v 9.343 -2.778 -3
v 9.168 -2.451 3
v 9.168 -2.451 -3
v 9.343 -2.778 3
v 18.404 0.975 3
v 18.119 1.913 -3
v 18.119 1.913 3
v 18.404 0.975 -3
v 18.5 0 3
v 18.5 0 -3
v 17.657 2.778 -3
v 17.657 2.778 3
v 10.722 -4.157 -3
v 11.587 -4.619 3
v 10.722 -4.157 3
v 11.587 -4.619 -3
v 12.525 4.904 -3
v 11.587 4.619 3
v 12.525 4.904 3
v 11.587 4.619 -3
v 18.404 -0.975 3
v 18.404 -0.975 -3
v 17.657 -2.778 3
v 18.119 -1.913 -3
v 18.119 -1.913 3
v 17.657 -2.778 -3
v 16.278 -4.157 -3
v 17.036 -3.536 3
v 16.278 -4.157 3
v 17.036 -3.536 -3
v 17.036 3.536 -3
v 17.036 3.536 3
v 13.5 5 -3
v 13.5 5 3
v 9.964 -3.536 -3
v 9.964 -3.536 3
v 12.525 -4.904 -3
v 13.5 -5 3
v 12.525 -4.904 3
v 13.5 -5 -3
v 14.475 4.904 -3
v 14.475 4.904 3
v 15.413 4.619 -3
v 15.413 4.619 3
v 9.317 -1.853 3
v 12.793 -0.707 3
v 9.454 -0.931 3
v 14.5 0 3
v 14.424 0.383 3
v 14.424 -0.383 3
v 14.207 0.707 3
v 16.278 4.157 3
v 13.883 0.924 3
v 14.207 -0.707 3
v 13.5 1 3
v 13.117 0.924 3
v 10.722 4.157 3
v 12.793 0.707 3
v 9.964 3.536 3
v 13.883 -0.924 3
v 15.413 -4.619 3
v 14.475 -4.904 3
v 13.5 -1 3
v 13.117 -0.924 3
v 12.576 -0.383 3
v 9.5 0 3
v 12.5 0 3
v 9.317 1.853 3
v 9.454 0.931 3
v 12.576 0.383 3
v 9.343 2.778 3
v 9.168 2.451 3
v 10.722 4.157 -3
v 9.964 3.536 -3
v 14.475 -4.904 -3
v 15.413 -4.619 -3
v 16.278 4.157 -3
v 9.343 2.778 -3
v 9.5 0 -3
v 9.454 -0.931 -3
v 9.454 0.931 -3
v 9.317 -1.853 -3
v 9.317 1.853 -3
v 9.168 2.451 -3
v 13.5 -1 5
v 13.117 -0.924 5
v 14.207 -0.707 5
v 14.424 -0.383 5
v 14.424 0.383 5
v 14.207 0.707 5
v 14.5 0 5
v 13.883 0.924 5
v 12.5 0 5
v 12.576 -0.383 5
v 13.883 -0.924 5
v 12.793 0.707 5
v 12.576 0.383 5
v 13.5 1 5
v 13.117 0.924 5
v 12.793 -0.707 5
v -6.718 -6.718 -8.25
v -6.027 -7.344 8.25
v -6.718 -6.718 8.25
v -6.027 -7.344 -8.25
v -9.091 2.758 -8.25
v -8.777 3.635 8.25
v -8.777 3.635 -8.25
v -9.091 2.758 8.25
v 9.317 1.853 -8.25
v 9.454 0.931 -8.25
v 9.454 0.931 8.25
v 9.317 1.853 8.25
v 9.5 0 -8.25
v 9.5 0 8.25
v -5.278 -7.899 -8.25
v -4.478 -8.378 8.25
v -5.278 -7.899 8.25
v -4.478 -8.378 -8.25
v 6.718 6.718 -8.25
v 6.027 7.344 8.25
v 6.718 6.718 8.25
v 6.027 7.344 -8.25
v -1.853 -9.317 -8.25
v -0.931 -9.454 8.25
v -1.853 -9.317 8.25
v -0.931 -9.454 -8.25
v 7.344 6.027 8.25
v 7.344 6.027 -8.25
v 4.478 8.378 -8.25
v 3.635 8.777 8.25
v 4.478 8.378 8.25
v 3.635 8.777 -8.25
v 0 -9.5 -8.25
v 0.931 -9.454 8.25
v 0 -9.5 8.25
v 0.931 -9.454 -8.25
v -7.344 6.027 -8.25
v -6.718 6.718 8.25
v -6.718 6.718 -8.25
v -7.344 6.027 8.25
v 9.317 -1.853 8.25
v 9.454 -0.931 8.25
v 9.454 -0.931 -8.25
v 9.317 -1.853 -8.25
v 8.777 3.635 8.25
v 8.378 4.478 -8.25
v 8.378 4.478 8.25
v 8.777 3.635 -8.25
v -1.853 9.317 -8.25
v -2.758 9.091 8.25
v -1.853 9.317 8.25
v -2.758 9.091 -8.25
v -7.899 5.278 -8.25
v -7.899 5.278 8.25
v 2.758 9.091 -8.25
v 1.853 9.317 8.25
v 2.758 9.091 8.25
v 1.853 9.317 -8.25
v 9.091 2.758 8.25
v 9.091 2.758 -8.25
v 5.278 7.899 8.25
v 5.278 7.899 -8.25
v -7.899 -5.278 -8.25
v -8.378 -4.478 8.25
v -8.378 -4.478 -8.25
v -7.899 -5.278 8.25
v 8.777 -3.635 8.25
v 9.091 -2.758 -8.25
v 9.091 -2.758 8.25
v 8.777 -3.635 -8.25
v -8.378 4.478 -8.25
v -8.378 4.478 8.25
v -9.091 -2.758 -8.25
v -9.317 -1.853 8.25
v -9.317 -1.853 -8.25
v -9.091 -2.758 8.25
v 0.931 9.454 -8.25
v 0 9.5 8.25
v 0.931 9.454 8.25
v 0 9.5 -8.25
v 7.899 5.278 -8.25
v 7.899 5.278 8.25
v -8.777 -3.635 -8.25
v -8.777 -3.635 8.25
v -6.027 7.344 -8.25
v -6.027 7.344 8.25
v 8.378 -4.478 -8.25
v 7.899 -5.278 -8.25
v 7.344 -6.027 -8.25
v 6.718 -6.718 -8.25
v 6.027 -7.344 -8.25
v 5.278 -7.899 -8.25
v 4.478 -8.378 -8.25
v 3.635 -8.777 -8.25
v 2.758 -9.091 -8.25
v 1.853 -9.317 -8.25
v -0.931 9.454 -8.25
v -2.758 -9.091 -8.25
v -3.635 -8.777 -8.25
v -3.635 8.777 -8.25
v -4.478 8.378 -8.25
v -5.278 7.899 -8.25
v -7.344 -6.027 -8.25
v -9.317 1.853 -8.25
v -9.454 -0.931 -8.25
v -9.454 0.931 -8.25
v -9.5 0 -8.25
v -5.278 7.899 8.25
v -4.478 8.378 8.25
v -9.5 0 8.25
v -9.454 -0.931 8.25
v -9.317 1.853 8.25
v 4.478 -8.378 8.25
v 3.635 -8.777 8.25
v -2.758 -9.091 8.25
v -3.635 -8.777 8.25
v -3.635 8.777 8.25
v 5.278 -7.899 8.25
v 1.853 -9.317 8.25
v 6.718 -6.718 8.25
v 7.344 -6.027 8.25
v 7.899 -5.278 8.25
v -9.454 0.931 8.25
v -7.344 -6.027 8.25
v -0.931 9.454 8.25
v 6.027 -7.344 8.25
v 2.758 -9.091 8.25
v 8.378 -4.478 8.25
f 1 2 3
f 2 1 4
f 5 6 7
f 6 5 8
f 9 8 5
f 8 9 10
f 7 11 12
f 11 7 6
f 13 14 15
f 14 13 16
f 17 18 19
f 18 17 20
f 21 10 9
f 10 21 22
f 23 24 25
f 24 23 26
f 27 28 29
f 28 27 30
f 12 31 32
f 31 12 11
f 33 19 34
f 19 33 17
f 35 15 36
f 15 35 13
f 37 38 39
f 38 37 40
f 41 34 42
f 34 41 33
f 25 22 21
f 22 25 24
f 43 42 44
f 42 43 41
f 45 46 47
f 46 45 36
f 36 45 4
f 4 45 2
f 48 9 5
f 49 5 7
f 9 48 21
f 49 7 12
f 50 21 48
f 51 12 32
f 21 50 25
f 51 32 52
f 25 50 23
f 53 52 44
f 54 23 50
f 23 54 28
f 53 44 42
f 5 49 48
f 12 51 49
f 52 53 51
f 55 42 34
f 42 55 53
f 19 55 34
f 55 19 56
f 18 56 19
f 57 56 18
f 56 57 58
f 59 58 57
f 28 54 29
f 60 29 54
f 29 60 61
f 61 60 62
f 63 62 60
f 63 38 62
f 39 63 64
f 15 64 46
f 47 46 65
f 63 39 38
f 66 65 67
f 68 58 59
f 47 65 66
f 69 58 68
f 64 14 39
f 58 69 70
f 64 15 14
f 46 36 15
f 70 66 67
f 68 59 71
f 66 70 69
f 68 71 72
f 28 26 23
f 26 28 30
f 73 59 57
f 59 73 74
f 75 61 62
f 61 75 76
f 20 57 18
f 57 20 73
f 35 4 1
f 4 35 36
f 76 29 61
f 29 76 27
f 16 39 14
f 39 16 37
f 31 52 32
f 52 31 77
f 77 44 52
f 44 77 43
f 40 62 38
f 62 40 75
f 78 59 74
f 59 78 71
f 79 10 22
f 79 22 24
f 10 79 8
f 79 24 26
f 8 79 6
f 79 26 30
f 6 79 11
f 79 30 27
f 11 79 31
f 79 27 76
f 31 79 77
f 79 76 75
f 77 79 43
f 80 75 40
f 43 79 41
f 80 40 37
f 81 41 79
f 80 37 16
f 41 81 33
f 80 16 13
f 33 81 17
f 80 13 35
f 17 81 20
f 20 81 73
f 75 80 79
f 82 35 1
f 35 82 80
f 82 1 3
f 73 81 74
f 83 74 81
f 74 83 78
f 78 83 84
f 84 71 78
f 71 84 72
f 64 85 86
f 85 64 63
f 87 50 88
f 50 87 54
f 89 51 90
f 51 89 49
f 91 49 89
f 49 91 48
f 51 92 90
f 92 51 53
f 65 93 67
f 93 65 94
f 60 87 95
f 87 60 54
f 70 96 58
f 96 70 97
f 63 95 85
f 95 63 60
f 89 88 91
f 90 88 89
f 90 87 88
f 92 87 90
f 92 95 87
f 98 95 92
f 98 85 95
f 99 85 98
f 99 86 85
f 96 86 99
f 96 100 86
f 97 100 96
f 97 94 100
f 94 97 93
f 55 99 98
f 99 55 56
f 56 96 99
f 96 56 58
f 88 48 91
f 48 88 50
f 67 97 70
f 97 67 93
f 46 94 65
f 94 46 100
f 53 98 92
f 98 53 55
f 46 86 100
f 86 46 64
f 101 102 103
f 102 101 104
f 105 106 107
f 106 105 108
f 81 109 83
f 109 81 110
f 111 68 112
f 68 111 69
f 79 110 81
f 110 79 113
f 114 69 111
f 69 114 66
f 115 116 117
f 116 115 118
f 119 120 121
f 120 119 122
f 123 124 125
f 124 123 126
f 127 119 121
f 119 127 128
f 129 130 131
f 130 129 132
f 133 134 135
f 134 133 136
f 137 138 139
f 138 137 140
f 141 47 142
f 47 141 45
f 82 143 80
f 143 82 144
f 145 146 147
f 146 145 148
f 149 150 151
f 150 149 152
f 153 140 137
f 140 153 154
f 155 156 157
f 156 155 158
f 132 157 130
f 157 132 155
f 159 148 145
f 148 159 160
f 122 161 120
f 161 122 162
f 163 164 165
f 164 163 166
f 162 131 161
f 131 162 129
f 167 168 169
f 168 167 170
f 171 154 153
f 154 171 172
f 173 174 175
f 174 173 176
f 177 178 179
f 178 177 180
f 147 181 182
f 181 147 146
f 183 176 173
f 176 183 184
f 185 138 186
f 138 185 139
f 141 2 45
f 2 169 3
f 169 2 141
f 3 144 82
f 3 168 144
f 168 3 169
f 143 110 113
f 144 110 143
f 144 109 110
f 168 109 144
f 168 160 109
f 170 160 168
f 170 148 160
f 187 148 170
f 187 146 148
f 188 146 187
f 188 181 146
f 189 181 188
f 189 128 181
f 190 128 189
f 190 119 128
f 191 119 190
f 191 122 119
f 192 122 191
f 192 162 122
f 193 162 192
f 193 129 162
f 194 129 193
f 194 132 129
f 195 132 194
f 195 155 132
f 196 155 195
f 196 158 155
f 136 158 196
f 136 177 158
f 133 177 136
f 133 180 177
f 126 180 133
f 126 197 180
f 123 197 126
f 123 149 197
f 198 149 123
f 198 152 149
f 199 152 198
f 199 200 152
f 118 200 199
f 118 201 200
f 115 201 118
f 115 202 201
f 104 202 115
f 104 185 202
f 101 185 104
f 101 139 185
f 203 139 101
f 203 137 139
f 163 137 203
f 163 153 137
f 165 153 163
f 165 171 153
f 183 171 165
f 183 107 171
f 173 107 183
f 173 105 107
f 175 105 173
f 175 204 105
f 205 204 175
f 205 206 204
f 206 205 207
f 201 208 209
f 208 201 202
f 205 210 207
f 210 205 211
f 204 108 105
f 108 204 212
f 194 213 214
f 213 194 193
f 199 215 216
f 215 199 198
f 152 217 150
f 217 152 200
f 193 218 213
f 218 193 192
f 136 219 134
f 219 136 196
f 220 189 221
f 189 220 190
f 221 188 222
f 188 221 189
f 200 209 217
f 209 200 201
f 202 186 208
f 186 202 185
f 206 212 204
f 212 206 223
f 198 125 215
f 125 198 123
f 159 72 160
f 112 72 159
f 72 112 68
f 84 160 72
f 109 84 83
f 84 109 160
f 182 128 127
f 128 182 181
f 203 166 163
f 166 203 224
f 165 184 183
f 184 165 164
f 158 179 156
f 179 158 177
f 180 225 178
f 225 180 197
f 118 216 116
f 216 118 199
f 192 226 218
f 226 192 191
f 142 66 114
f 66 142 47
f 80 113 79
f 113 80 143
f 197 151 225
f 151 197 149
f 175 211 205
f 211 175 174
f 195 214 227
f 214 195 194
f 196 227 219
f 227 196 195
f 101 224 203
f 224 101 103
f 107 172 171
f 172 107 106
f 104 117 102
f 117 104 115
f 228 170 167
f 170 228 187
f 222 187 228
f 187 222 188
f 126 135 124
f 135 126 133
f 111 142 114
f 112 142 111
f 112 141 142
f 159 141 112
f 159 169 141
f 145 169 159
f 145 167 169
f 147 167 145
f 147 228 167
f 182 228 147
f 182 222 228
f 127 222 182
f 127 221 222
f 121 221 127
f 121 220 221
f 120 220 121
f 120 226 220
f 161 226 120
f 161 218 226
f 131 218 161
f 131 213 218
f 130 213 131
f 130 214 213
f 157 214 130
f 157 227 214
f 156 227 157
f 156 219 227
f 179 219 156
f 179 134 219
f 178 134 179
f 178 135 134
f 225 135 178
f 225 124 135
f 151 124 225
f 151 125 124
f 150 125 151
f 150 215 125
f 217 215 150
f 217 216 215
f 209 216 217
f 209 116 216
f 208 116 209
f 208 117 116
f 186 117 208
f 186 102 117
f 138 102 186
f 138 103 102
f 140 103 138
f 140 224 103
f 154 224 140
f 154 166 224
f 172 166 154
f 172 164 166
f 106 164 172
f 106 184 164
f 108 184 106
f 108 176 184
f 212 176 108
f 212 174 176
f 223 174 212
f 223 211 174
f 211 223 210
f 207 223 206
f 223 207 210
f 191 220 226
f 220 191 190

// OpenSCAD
// Parameters
stator_outer_diameter_mm = 17.75; //[8.875:35.5:0.05]
stator_height_mm = 14.5; //[7.25:29:0.1]
stator_bore_diameter_mm = 5; //[2.5:10:0.05]
rotor_outer_diameter_mm = 19; //[9.5:38:0.05]
endcap_thickness_mm = 1; //[0.5:2:0.05]
clearance_mm = 0.2; //[0.1:0.6:0.05]
overlap_mm = 1; //[0.5:2:0.1]
include_bore = 1; //[0:1:1]
buzzer_diameter_mm = 10; //[5:20:0.1]
buzzer_height_mm = 6; //[3:12:0.1]
buzzer_pin_diameter_mm = 2; //[1:4:0.1]
buzzer_pin_height_mm = 3; //[1:8:0.1]

// Buzzer - complete geometry
module buzzer() {
  color([0.85, 0.85, 0.8]) {
    // Buzzer body
    translate([rotor_outer_diameter_mm/2 + buzzer_diameter_mm/2 - overlap_mm, 0, 0])
      cylinder(r=buzzer_diameter_mm/2, h=buzzer_height_mm, center=true, $fn=32);
    // Buzzer pin
    translate([rotor_outer_diameter_mm/2 + buzzer_diameter_mm/2 - overlap_mm, 0, buzzer_height_mm/2 + buzzer_pin_height_mm/2 - overlap_mm])
      cylinder(r=buzzer_pin_diameter_mm/2, h=buzzer_pin_height_mm, center=true, $fn=16);
  }
}

// Assembly
module assembly() {
  // Stator core with optional bore
  difference() {
    color("DimGray") {
      translate([0, 0, 0])
        cylinder(r=stator_outer_diameter_mm/2, h=stator_height_mm, center=true, $fn=64);
    }
    if (include_bore) {
      translate([0, 0, 0])
        cylinder(r=(stator_bore_diameter_mm/2) * include_bore, h=stator_height_mm + 2*overlap_mm, center=true, $fn=32);
    }
  }
  
  // Rotor can envelope
  color("Black") {
    translate([0, 0, 0])
      cylinder(r=rotor_outer_diameter_mm/2, h=stator_height_mm + 2*endcap_thickness_mm, center=true, $fn=64);
  }
  
  // Endcap top
  color("Silver") {
    translate([0, 0, stator_height_mm/2 + endcap_thickness_mm/2 - overlap_mm])
      cylinder(r=rotor_outer_diameter_mm/2, h=endcap_thickness_mm, center=true, $fn=64);
  }
  
  // Endcap bottom
  color("Silver") {
    translate([0, 0, -stator_height_mm/2 - endcap_thickness_mm/2 + overlap_mm])
      cylinder(r=rotor_outer_diameter_mm/2, h=endcap_thickness_mm, center=true, $fn=64);
  }
  
  // Buzzer
  buzzer();
}

assembly();
